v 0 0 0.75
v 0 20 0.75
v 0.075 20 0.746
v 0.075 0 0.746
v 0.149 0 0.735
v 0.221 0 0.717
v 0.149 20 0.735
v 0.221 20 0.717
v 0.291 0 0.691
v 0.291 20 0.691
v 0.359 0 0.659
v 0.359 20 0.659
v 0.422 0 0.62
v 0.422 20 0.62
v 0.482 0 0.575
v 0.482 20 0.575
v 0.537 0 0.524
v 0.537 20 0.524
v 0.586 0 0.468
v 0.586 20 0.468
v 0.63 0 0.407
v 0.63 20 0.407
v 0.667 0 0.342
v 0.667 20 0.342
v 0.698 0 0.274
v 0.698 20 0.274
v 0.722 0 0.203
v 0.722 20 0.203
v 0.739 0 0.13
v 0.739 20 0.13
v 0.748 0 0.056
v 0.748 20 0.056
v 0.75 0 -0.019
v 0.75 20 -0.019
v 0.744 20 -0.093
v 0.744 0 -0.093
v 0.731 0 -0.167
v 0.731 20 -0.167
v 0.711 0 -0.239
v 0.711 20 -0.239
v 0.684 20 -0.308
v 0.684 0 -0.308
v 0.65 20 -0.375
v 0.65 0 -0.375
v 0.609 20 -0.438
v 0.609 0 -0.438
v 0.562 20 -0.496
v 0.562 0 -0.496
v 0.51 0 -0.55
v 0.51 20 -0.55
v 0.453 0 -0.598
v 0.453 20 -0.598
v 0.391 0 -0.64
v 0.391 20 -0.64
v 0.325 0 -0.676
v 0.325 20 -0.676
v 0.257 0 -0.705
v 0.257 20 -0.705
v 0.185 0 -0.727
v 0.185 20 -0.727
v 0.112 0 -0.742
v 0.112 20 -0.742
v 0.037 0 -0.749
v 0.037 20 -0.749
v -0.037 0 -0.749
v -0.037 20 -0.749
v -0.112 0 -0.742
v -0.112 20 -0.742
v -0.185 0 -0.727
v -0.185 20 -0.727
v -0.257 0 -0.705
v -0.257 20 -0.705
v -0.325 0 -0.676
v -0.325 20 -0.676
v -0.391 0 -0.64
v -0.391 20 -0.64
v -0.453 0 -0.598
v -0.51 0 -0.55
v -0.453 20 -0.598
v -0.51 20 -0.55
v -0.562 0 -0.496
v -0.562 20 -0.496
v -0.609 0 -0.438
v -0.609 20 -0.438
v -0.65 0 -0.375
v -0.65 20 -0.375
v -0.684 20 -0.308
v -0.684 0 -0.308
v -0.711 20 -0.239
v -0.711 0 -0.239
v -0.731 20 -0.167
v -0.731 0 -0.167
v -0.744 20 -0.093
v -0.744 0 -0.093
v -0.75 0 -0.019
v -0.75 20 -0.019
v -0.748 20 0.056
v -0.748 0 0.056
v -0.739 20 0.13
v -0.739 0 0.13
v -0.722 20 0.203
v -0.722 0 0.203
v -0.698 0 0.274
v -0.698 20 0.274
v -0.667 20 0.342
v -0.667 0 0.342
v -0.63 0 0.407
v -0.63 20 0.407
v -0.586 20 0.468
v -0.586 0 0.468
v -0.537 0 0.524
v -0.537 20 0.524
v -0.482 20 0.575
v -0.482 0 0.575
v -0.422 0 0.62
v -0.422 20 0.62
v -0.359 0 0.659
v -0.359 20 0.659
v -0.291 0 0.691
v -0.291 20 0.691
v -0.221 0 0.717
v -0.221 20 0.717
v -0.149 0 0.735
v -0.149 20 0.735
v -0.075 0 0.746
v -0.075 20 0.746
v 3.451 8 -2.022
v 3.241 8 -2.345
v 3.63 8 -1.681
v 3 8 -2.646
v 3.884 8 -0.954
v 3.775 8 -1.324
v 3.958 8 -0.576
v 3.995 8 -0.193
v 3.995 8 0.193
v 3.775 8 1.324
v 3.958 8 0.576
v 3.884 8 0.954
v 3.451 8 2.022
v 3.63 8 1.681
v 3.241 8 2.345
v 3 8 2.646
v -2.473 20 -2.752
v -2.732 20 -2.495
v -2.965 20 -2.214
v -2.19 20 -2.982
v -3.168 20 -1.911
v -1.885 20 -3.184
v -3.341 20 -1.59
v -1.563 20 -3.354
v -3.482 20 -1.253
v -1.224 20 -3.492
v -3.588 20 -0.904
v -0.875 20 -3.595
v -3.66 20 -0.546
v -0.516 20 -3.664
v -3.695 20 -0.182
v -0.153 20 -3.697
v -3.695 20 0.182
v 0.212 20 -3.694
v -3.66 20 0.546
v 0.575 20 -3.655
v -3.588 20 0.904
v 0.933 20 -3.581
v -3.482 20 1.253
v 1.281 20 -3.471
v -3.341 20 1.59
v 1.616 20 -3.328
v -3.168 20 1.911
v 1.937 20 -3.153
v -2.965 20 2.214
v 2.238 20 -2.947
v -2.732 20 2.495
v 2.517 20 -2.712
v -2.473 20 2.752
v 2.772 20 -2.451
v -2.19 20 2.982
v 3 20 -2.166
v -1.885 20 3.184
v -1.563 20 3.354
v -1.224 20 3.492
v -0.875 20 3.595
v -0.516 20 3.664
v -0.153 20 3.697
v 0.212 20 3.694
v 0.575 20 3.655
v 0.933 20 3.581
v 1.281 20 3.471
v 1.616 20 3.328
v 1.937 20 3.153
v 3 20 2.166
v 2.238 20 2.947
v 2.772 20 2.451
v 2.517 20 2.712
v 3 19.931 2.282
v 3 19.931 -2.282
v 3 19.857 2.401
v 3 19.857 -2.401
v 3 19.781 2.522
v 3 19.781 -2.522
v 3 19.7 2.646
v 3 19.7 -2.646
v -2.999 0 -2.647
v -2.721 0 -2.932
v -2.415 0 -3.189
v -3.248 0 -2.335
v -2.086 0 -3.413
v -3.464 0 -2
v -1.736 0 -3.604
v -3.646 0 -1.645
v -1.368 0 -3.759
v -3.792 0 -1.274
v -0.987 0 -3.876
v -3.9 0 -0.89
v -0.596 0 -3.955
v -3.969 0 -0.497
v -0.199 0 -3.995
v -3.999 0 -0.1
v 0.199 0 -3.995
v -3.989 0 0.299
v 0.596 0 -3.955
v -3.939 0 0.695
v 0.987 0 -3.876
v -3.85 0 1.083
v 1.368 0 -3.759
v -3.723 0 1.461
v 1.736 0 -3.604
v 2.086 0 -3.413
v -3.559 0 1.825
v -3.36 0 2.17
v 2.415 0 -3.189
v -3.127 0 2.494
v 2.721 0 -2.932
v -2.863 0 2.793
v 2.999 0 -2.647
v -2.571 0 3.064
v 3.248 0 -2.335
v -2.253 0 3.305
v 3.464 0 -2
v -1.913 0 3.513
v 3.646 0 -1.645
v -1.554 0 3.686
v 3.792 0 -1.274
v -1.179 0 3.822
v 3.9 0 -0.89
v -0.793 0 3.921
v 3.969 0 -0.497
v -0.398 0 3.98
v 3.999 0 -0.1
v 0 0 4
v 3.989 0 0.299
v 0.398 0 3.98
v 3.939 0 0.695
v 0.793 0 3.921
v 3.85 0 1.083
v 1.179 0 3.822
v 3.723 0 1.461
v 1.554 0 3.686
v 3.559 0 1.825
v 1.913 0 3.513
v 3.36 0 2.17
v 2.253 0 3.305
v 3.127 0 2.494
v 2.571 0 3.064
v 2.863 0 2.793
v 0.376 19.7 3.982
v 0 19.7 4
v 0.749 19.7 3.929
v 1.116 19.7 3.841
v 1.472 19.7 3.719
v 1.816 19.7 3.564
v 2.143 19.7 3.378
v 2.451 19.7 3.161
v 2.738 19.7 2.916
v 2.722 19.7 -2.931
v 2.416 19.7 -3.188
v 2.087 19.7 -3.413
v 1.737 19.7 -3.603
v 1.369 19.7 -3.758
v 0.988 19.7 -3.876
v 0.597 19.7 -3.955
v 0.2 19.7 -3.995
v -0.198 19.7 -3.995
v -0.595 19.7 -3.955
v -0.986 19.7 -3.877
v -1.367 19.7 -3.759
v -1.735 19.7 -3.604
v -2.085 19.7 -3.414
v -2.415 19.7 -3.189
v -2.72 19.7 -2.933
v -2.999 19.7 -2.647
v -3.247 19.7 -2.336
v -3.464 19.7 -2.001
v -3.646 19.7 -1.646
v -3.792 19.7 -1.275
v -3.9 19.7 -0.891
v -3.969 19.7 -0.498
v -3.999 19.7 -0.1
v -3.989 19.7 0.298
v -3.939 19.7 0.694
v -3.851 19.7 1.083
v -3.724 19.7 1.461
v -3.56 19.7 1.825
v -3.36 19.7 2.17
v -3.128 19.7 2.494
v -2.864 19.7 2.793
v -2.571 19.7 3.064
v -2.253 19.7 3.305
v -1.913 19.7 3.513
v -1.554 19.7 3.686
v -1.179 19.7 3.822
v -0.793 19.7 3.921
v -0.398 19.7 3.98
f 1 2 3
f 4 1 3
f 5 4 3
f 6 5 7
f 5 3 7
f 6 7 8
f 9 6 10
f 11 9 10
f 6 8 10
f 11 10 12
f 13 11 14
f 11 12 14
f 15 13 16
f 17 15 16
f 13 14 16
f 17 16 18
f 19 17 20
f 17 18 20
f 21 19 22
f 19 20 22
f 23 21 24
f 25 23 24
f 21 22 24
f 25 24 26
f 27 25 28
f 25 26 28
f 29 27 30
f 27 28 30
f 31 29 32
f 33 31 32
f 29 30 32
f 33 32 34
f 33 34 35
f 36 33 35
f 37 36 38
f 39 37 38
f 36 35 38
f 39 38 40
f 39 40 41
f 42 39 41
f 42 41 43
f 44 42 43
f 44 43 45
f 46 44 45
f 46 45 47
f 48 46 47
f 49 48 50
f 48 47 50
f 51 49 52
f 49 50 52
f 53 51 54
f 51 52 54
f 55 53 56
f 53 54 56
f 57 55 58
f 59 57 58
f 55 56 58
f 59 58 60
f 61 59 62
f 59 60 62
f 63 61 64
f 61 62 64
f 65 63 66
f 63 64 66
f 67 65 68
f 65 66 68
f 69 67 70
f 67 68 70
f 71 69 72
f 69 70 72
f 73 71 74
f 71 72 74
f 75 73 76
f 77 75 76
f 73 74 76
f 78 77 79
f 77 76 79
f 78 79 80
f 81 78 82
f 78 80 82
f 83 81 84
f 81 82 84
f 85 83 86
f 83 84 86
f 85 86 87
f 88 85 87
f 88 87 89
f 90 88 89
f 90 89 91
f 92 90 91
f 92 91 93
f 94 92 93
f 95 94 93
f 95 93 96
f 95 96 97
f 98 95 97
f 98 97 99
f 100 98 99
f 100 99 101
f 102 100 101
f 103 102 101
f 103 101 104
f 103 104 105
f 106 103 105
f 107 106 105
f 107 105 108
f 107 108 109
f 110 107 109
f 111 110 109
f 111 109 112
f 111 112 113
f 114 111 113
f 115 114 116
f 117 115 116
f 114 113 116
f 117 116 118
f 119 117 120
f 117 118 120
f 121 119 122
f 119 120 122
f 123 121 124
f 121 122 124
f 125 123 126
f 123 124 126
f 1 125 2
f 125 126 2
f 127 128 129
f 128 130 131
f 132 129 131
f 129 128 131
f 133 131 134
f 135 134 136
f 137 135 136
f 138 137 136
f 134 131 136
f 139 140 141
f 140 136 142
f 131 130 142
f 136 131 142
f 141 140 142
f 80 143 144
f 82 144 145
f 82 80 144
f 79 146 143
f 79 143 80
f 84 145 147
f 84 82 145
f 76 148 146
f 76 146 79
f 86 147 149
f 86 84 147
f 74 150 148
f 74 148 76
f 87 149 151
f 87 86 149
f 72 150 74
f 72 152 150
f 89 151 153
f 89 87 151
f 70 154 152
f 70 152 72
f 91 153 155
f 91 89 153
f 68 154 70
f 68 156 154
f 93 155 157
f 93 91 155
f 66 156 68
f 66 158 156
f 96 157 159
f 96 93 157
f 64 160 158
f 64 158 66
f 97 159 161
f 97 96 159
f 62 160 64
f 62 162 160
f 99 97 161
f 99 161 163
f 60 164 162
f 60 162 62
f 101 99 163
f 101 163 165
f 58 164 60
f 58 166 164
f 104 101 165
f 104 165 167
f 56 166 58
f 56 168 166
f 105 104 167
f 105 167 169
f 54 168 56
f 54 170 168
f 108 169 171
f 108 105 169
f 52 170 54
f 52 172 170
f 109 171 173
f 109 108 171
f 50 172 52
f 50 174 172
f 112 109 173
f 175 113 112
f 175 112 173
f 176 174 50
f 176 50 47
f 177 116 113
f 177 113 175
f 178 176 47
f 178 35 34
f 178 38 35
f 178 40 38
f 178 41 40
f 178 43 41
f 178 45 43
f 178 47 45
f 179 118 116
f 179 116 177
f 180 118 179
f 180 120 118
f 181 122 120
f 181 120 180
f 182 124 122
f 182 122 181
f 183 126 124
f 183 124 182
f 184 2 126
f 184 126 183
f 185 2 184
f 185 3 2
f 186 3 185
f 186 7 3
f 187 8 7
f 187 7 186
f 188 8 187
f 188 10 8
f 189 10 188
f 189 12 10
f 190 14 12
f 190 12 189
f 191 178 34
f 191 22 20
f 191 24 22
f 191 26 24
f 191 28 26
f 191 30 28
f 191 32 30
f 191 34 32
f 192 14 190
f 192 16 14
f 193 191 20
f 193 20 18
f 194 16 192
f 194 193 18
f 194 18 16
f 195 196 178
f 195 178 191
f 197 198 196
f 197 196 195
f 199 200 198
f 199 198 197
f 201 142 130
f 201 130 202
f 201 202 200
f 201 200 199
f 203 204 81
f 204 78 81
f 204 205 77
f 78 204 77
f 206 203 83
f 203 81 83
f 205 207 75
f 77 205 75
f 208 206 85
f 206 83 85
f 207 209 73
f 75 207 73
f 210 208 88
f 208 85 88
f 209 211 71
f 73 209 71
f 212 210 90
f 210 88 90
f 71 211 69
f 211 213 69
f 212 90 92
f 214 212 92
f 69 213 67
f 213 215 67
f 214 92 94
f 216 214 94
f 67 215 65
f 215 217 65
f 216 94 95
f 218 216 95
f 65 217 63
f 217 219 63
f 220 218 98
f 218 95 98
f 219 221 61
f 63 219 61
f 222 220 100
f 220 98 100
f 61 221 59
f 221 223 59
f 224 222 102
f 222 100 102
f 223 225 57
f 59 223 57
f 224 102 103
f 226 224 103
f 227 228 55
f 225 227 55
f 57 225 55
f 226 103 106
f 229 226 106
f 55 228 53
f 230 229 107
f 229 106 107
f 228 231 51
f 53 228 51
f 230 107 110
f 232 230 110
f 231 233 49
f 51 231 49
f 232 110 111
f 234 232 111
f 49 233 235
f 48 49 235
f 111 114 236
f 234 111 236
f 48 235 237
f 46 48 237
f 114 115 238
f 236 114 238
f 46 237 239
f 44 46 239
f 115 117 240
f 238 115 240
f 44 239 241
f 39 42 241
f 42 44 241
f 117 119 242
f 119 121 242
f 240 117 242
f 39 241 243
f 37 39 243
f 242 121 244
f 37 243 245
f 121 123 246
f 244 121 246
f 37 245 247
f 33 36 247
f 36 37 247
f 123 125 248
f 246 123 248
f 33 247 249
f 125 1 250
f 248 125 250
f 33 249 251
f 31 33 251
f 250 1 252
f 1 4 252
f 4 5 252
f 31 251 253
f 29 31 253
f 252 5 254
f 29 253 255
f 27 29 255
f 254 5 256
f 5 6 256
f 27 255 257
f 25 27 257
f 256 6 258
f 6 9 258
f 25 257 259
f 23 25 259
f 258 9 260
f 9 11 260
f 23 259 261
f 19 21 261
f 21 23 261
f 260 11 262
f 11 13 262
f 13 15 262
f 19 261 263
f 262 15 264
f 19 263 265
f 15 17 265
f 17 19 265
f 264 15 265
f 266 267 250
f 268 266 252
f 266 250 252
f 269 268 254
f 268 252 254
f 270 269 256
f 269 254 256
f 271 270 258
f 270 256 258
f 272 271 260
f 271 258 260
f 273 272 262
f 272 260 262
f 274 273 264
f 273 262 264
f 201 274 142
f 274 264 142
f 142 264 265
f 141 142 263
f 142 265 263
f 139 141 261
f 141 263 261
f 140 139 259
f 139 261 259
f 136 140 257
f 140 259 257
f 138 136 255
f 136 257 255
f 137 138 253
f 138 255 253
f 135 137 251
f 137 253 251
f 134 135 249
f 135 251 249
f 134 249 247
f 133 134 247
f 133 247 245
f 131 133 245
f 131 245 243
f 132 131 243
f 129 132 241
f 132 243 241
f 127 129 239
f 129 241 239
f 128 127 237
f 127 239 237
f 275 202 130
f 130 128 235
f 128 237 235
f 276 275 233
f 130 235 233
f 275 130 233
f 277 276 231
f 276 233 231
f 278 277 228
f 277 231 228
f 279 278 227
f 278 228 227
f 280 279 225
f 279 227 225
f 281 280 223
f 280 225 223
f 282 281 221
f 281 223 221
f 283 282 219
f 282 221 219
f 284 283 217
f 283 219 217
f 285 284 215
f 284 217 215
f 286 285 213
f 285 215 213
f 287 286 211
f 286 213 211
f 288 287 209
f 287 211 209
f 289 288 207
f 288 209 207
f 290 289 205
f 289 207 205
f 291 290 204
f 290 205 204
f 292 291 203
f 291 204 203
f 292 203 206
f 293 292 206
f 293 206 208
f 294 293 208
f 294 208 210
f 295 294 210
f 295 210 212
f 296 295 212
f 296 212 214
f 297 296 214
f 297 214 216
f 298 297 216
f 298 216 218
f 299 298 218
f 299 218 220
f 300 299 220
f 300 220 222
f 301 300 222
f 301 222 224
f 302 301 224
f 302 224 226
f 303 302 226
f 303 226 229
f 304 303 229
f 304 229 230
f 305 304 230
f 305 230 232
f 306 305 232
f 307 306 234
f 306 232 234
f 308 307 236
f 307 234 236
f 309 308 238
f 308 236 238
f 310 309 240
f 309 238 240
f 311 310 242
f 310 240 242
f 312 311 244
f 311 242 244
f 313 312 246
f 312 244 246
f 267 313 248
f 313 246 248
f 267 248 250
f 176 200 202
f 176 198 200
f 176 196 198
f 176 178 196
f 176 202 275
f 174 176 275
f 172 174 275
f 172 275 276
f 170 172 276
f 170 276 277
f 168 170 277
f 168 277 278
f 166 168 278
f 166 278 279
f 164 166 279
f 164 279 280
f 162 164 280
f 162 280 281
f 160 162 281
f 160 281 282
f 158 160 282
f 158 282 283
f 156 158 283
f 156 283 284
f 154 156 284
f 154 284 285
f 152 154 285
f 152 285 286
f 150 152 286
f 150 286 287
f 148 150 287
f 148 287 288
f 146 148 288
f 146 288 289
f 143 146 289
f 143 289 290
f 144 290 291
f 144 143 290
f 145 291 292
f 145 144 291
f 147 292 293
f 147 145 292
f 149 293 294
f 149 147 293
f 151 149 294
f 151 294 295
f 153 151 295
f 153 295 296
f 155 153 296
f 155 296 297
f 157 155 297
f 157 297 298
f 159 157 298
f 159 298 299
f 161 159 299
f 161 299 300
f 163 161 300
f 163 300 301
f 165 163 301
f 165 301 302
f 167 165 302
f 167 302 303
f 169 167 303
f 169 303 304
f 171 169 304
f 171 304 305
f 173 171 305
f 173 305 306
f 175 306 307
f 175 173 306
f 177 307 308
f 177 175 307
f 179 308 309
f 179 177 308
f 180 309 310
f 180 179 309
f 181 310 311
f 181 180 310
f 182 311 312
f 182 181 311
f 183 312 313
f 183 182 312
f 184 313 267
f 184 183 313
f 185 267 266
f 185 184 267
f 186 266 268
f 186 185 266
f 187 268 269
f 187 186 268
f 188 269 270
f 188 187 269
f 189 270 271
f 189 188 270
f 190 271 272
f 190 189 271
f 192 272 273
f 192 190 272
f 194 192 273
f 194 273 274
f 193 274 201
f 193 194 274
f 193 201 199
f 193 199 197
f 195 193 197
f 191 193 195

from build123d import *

# Parameters (mm, degrees)
SKETCH2_R           = 4
BOSS_EXTRUDE1_DEPTH = 20
SKETCH3_W           = 1
SKETCH3_H           = 12
CUT_EXTRUDE2_DEPTH  = 10
CHAMFER1_SIZE       = 0.3
SKETCH4_R           = 0.75
CUT_EXTRUDE3_DEPTH  = 20


with BuildPart() as part:
    # Sketch2 → Boss-Extrude1 (new body)
    with BuildSketch(Plane(origin=(0, 0, 0), x_dir=(1, 0, 0), z_dir=(0, 1, 0))):
        with Locations(Location((0, 0, 0), (0, 0, 270))):
            Circle(SKETCH2_R)
    extrude(amount=BOSS_EXTRUDE1_DEPTH)

    # Sketch3 → Cut-Extrude2 (cut, symmetric)
    with BuildSketch(Plane.XY):
        with Locations((3.5, 14)):
            Rectangle(SKETCH3_W, SKETCH3_H)
    extrude(amount=CUT_EXTRUDE2_DEPTH, both=True, mode=Mode.SUBTRACT)

    # Chamfer1
    chamfer1_edges = [part.edges().sort_by_distance(p)[0] for p in [
        (-3.645751311, 20, -1.645751311),
    ]]
    chamfer(chamfer1_edges, length=CHAMFER1_SIZE)

    # Sketch4 → Cut-Extrude3 (cut)
    with BuildSketch(Plane(origin=(0, 20, 0), x_dir=(1, 0, 0), z_dir=(0, 1, 0))):
        with Locations(Location((0, 0, 0), (0, 0, 270))):
            Circle(SKETCH4_R)
    extrude(amount=-CUT_EXTRUDE3_DEPTH, mode=Mode.SUBTRACT)


solid = part.part
